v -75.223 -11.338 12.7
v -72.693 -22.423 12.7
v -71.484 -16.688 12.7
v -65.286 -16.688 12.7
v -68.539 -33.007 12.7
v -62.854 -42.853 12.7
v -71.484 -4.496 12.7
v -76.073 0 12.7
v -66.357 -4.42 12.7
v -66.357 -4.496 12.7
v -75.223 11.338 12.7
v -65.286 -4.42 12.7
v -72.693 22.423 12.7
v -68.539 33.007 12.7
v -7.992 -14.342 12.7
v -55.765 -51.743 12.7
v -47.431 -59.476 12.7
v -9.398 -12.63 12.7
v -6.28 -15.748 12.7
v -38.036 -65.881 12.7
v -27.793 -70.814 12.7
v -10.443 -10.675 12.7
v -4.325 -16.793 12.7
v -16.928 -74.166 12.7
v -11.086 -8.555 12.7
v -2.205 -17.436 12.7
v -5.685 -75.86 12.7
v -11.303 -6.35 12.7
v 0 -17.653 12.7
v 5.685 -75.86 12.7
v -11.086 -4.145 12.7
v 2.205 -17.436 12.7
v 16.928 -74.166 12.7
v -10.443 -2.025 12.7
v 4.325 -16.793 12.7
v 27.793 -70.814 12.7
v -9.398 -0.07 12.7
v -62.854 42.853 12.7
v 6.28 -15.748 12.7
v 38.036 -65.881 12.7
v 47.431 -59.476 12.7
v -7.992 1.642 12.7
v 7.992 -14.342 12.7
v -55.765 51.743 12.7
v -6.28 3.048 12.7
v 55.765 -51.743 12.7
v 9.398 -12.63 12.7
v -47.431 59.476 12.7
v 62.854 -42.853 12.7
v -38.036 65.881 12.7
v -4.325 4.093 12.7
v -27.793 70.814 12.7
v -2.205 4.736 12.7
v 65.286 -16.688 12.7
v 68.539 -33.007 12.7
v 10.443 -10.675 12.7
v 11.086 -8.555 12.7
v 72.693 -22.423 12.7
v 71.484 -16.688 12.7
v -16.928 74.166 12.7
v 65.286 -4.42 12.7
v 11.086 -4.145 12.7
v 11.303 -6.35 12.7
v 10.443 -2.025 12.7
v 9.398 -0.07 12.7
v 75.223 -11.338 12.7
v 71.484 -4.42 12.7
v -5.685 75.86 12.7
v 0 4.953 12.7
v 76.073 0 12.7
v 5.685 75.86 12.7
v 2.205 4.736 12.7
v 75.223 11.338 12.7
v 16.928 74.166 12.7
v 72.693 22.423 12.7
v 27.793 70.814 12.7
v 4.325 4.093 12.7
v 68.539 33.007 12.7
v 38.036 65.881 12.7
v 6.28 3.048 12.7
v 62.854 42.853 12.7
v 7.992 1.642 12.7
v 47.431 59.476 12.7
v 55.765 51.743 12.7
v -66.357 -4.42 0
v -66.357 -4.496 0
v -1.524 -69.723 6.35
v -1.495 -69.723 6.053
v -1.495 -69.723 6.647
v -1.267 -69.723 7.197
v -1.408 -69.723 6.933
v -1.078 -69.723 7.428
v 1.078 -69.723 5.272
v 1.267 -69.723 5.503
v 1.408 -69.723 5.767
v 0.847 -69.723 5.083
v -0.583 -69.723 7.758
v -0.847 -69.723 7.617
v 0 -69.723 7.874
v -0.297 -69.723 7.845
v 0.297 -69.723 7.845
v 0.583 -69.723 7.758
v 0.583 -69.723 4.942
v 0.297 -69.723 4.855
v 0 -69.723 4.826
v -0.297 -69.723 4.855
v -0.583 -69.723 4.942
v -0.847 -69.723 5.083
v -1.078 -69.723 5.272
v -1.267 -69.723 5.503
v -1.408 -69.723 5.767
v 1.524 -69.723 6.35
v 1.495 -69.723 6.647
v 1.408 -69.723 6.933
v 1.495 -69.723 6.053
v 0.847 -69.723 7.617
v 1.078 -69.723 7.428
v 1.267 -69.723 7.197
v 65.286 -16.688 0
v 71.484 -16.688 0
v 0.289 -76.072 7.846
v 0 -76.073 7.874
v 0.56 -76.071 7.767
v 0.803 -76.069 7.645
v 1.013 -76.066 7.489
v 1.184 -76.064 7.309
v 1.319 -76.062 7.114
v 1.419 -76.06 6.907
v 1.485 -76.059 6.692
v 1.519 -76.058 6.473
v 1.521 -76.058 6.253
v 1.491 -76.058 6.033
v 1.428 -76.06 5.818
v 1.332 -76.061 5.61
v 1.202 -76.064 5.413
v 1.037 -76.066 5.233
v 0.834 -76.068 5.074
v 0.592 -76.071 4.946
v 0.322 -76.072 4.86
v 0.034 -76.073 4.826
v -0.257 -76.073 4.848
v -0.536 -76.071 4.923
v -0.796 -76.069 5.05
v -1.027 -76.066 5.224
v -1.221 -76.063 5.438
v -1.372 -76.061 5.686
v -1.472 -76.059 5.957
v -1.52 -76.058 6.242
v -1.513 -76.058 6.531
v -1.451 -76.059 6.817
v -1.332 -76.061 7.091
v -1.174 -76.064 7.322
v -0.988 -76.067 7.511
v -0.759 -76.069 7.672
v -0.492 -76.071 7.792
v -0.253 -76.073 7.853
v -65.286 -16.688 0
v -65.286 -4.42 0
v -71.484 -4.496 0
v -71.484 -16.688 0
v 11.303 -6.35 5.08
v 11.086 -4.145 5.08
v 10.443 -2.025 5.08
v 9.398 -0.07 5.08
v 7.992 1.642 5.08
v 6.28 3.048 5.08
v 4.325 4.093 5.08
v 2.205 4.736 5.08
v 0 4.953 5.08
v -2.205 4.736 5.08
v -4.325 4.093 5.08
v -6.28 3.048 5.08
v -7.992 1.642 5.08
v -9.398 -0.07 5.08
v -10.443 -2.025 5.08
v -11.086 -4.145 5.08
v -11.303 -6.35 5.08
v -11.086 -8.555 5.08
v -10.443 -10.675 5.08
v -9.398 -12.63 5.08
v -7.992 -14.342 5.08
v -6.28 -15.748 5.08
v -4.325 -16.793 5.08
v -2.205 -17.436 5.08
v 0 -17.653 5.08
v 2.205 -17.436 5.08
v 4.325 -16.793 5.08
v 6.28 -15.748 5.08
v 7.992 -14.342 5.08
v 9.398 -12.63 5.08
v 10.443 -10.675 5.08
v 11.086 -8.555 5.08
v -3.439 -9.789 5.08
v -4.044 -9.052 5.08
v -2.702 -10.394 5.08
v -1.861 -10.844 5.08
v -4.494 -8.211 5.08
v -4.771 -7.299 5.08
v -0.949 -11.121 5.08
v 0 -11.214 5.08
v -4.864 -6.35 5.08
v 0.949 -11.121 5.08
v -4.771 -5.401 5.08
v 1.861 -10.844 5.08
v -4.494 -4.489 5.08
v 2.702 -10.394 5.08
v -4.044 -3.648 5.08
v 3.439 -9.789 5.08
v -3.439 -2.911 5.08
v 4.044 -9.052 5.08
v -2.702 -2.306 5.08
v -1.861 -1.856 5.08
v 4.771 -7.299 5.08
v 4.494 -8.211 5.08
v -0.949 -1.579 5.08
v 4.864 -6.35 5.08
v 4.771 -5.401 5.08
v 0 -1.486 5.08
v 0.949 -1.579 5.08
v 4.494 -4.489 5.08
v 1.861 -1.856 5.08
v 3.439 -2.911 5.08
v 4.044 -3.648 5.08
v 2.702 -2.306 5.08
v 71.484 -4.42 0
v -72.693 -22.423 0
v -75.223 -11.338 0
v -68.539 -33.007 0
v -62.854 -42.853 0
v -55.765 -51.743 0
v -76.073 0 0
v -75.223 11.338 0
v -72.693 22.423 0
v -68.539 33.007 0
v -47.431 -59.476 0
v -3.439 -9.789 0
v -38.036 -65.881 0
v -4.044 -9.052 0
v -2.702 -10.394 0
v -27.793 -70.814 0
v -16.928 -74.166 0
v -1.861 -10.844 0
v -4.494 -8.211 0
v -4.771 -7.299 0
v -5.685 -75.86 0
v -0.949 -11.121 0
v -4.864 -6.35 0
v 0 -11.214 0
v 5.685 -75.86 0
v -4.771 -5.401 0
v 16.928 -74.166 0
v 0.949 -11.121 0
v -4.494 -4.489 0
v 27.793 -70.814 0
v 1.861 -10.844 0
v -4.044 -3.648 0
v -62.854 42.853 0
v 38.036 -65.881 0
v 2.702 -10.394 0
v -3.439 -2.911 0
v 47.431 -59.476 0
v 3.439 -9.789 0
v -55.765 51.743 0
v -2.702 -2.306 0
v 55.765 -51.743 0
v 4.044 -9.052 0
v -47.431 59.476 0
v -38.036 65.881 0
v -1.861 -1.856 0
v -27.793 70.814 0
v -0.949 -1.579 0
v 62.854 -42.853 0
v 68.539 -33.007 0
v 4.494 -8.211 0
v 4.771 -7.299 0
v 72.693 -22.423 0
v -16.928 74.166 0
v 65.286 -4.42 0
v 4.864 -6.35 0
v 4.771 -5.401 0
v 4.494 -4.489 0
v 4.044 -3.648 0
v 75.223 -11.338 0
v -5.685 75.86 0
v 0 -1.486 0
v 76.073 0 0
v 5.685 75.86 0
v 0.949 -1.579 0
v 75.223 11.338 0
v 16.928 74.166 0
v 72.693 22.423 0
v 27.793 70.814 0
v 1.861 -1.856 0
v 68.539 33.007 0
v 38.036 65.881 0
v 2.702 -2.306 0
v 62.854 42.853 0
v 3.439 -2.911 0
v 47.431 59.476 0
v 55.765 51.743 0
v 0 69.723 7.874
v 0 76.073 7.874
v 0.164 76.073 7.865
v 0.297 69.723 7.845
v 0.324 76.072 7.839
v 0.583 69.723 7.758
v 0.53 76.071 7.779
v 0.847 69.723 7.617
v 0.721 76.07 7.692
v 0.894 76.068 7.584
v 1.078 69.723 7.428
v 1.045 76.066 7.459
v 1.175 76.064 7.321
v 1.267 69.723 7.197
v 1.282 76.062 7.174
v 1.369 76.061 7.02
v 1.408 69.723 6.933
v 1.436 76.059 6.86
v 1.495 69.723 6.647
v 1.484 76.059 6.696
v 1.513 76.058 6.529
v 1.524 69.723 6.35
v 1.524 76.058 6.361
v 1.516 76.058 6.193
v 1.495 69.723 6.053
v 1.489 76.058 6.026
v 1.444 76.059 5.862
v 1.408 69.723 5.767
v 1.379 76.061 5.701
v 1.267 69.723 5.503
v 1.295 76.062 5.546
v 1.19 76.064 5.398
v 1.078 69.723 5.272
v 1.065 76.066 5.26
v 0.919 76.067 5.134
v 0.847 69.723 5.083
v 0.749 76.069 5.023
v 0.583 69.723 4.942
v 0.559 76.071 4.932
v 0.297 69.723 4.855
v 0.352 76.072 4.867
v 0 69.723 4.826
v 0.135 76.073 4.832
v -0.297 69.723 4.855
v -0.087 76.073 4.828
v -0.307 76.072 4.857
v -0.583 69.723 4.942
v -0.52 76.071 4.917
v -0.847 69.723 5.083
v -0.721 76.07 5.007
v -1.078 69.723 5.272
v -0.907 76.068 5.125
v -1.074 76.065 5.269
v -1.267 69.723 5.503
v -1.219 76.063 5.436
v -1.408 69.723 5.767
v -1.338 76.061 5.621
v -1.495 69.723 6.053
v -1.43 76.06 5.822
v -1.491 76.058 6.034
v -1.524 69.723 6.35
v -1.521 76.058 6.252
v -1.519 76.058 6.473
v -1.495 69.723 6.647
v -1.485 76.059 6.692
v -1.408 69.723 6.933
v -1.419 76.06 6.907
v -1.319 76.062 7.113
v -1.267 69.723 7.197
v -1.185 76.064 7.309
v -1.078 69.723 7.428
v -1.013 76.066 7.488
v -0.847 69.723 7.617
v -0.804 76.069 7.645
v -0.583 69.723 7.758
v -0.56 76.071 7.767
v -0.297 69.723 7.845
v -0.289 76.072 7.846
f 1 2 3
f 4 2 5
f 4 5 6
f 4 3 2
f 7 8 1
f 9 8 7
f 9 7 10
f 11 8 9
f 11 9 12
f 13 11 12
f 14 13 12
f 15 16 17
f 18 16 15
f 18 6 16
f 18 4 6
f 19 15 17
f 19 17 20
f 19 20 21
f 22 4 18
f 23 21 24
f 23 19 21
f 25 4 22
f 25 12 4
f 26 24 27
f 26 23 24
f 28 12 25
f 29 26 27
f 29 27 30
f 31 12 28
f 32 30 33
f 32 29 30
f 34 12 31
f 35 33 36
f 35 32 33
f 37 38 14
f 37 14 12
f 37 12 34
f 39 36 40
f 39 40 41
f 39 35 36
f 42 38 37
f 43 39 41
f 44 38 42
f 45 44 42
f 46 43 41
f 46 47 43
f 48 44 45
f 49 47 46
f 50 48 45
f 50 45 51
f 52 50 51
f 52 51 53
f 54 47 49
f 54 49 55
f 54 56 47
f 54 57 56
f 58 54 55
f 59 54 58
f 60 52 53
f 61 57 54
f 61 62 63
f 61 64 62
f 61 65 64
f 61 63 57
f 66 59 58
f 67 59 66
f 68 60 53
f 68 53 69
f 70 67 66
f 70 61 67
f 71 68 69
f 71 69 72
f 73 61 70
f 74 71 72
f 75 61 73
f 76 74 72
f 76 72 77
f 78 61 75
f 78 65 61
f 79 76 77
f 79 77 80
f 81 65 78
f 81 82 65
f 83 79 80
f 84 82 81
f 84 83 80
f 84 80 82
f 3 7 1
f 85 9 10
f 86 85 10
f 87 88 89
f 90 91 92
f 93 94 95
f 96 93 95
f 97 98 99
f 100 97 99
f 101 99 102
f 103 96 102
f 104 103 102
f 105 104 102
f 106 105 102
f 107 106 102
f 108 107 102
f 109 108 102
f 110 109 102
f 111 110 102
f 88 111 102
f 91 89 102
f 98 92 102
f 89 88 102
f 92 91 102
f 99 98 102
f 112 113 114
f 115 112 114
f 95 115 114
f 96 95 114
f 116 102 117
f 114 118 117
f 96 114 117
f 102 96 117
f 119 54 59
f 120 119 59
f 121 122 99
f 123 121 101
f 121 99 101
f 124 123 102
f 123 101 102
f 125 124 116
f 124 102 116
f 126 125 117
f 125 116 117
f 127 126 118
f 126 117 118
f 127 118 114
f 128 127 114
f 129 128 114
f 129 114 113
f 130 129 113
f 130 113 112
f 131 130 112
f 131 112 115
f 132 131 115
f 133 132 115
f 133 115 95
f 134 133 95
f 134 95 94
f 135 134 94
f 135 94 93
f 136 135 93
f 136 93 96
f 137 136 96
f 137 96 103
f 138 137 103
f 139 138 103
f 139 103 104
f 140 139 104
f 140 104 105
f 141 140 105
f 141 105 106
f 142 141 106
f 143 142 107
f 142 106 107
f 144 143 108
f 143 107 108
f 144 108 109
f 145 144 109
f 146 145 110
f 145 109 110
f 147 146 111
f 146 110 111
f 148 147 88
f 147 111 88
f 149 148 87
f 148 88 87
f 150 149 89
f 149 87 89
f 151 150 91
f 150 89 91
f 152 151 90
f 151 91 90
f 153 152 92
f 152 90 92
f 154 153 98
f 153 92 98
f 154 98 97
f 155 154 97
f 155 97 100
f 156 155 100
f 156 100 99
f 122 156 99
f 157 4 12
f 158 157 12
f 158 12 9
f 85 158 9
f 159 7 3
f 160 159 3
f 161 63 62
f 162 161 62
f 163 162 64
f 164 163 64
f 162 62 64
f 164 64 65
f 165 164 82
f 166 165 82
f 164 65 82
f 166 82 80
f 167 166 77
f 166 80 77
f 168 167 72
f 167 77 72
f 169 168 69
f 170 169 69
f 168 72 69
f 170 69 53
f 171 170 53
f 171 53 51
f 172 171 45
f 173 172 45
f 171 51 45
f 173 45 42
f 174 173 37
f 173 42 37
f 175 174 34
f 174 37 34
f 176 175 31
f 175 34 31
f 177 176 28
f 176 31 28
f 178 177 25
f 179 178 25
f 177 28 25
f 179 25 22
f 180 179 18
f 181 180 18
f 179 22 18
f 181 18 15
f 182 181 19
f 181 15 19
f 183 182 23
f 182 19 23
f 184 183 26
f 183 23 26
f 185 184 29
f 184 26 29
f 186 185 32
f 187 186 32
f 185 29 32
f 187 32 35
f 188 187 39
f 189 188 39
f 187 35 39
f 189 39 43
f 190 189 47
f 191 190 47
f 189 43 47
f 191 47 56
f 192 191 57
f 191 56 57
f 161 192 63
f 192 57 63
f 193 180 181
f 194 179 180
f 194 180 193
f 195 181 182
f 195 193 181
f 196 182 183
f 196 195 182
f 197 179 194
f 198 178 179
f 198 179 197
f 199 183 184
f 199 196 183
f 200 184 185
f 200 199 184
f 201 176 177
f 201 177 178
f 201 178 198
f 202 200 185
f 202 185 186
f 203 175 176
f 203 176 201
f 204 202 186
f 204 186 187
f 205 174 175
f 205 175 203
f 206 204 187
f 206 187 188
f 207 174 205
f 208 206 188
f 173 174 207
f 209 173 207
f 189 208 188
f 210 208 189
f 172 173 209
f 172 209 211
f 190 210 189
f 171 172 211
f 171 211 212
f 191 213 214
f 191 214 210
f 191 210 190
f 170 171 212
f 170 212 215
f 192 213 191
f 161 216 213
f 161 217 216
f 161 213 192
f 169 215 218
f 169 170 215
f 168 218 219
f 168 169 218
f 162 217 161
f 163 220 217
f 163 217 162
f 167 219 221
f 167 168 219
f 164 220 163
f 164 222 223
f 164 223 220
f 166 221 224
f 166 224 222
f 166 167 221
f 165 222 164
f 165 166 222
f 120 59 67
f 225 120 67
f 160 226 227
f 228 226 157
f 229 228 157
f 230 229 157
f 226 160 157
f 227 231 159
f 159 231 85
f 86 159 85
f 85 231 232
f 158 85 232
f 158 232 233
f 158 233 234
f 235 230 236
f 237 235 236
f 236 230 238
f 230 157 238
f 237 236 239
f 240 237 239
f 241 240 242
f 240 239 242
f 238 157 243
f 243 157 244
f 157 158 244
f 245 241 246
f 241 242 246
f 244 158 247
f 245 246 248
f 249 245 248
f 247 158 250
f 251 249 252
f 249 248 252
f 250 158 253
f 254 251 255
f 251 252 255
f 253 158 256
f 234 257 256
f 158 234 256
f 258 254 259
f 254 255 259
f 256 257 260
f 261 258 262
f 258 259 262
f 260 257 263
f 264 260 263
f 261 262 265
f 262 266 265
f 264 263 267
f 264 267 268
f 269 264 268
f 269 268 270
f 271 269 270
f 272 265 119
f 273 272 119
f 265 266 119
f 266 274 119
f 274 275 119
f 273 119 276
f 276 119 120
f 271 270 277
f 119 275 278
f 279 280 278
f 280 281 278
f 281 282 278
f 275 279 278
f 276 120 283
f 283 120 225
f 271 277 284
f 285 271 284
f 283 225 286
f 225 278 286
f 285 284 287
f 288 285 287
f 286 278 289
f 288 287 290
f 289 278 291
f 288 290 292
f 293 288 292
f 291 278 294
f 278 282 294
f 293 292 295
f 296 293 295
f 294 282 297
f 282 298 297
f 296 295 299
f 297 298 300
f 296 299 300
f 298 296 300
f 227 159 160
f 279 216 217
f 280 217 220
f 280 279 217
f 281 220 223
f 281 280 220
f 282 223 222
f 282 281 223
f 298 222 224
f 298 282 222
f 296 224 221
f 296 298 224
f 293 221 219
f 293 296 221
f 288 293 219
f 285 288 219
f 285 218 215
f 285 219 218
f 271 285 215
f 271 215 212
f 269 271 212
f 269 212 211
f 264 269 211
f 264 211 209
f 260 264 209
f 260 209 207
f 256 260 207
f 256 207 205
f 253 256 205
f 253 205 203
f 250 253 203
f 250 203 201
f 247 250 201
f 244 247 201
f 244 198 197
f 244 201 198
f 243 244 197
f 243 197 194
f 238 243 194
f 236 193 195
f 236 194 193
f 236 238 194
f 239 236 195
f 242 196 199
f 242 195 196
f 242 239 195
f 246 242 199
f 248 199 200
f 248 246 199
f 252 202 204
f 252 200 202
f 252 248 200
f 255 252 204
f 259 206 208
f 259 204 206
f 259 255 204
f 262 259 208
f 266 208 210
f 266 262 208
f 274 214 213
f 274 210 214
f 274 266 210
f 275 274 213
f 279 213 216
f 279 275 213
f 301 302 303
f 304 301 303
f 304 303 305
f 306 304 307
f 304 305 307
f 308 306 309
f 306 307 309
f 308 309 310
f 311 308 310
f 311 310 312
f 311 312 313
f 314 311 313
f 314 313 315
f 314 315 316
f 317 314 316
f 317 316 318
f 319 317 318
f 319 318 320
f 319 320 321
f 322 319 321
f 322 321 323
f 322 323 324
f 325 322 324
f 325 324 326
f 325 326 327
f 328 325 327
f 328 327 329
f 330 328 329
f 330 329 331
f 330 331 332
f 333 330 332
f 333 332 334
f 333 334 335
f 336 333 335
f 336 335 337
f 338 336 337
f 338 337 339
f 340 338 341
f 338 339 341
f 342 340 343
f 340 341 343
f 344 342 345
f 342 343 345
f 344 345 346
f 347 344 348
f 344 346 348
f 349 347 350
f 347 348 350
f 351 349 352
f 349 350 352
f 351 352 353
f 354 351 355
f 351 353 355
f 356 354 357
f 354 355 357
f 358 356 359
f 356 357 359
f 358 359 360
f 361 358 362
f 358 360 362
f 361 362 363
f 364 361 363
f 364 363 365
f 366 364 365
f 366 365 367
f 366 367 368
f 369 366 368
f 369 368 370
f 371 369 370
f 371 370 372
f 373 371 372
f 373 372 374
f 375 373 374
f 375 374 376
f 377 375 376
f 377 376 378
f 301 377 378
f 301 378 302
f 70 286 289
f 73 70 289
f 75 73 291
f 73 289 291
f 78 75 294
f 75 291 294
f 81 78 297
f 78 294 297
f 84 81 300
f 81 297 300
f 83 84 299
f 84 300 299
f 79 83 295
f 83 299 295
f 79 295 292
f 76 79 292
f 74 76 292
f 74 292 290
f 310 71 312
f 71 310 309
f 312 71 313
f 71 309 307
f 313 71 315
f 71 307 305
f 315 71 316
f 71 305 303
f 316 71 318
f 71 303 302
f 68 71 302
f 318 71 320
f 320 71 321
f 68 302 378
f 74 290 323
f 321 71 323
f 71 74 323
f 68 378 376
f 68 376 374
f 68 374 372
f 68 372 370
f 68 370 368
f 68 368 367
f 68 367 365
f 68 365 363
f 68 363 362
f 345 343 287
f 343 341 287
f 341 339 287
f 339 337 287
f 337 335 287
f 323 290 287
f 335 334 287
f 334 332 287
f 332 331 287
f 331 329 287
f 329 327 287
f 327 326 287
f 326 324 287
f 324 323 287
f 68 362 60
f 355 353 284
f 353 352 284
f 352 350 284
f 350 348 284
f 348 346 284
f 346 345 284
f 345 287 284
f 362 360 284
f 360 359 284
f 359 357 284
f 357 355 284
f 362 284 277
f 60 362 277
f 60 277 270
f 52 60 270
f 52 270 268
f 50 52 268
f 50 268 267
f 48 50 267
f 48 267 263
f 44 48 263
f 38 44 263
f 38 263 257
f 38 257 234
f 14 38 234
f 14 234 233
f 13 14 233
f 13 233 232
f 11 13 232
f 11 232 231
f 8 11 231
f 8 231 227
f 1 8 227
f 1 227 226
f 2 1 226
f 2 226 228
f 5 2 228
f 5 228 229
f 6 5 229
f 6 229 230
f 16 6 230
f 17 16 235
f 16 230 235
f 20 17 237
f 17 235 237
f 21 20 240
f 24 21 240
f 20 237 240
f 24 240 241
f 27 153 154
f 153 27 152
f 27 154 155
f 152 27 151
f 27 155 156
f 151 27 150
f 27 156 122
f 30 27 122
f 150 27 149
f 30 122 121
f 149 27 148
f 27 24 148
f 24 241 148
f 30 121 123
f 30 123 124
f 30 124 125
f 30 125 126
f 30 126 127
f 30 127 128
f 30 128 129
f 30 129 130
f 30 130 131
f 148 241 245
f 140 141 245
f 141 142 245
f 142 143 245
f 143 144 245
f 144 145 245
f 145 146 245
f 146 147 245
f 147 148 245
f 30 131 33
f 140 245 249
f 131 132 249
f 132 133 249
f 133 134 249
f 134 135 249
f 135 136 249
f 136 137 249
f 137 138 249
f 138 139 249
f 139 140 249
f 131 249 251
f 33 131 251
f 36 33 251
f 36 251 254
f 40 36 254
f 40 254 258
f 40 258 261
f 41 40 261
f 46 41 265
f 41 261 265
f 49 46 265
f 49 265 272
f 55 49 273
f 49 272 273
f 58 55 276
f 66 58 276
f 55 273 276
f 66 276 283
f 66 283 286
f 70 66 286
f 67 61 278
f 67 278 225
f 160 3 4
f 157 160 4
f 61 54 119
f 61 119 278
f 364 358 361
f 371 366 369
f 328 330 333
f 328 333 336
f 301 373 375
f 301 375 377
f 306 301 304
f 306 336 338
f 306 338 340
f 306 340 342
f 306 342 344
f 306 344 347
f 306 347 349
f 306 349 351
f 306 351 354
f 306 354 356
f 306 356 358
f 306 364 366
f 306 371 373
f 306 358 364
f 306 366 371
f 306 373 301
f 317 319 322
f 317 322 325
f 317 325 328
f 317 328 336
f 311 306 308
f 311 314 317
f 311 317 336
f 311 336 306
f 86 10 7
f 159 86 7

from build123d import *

# Parameters (mm, degrees)
SKETCH1_R           = 76.073
SKETCH1_R_2         = 4.8641
BOSS_EXTRUDE1_DEPTH = 12.7
SKETCH2_W           = 6.1976
SKETCH2_H           = 12.2682
CUT_EXTRUDE1_DEPTH  = 109.330478897
SKETCH3_R           = 11.303
CUT_EXTRUDE2_DEPTH  = 7.62
CUT_EXTRUDE3_START  = 76.073
SKETCH5_R           = 1.524
CUT_EXTRUDE3_DEPTH  = 6.35
CUT_EXTRUDE4_START  = -69.723
SKETCH6_R           = 1.524
CUT_EXTRUDE4_DEPTH  = 6.35


with BuildPart() as part:
    # Sketch1 → Boss-Extrude1 (new body)
    with BuildSketch(Plane.XY):
        Circle(SKETCH1_R)
        with Locations((0, -6.35)):
            Circle(SKETCH1_R_2, mode=Mode.SUBTRACT)
    extrude(amount=BOSS_EXTRUDE1_DEPTH)

    # Sketch2 → Cut-Extrude1 (cut, through all)
    with BuildSketch(Plane.XY.offset(12.7)):
        with Locations((68.3851714, -10.5537)):
            Rectangle(SKETCH2_W, SKETCH2_H)
        Polygon((-71.4839714, -4.4958), (-71.4839714, -16.6878), (-65.2863714, -16.6878), (-65.2863714, -4.4196), (-66.357360373, -4.4196), (-66.357360373, -4.4958), align=None)
    extrude(amount=-CUT_EXTRUDE1_DEPTH, mode=Mode.SUBTRACT)

    # Sketch3 → Cut-Extrude2 (cut)
    with BuildSketch(Plane.XY.offset(12.7)):
        with Locations((0, -6.35)):
            Circle(SKETCH3_R)
    extrude(amount=-CUT_EXTRUDE2_DEPTH, mode=Mode.SUBTRACT)

    # Sketch5 → Cut-Extrude3 (cut)
    with BuildSketch(Plane(origin=(0, 0, 0), x_dir=(1, 0, 0), z_dir=(0, 1, 0)).offset(CUT_EXTRUDE3_START)):
        with Locations(Location((0, -6.35, 0), (0, 0, 270))):
            Circle(SKETCH5_R)
    extrude(amount=-CUT_EXTRUDE3_DEPTH, mode=Mode.SUBTRACT)

    # Sketch6 → Cut-Extrude4 (cut)
    with BuildSketch(Plane(origin=(0, 0, 0), x_dir=(1, 0, 0), z_dir=(0, 1, 0)).offset(CUT_EXTRUDE4_START)):
        with Locations(Location((0, -6.35, 0), (0, 0, 270))):
            Circle(SKETCH6_R)
    extrude(amount=-CUT_EXTRUDE4_DEPTH, mode=Mode.SUBTRACT)


solid = part.part
